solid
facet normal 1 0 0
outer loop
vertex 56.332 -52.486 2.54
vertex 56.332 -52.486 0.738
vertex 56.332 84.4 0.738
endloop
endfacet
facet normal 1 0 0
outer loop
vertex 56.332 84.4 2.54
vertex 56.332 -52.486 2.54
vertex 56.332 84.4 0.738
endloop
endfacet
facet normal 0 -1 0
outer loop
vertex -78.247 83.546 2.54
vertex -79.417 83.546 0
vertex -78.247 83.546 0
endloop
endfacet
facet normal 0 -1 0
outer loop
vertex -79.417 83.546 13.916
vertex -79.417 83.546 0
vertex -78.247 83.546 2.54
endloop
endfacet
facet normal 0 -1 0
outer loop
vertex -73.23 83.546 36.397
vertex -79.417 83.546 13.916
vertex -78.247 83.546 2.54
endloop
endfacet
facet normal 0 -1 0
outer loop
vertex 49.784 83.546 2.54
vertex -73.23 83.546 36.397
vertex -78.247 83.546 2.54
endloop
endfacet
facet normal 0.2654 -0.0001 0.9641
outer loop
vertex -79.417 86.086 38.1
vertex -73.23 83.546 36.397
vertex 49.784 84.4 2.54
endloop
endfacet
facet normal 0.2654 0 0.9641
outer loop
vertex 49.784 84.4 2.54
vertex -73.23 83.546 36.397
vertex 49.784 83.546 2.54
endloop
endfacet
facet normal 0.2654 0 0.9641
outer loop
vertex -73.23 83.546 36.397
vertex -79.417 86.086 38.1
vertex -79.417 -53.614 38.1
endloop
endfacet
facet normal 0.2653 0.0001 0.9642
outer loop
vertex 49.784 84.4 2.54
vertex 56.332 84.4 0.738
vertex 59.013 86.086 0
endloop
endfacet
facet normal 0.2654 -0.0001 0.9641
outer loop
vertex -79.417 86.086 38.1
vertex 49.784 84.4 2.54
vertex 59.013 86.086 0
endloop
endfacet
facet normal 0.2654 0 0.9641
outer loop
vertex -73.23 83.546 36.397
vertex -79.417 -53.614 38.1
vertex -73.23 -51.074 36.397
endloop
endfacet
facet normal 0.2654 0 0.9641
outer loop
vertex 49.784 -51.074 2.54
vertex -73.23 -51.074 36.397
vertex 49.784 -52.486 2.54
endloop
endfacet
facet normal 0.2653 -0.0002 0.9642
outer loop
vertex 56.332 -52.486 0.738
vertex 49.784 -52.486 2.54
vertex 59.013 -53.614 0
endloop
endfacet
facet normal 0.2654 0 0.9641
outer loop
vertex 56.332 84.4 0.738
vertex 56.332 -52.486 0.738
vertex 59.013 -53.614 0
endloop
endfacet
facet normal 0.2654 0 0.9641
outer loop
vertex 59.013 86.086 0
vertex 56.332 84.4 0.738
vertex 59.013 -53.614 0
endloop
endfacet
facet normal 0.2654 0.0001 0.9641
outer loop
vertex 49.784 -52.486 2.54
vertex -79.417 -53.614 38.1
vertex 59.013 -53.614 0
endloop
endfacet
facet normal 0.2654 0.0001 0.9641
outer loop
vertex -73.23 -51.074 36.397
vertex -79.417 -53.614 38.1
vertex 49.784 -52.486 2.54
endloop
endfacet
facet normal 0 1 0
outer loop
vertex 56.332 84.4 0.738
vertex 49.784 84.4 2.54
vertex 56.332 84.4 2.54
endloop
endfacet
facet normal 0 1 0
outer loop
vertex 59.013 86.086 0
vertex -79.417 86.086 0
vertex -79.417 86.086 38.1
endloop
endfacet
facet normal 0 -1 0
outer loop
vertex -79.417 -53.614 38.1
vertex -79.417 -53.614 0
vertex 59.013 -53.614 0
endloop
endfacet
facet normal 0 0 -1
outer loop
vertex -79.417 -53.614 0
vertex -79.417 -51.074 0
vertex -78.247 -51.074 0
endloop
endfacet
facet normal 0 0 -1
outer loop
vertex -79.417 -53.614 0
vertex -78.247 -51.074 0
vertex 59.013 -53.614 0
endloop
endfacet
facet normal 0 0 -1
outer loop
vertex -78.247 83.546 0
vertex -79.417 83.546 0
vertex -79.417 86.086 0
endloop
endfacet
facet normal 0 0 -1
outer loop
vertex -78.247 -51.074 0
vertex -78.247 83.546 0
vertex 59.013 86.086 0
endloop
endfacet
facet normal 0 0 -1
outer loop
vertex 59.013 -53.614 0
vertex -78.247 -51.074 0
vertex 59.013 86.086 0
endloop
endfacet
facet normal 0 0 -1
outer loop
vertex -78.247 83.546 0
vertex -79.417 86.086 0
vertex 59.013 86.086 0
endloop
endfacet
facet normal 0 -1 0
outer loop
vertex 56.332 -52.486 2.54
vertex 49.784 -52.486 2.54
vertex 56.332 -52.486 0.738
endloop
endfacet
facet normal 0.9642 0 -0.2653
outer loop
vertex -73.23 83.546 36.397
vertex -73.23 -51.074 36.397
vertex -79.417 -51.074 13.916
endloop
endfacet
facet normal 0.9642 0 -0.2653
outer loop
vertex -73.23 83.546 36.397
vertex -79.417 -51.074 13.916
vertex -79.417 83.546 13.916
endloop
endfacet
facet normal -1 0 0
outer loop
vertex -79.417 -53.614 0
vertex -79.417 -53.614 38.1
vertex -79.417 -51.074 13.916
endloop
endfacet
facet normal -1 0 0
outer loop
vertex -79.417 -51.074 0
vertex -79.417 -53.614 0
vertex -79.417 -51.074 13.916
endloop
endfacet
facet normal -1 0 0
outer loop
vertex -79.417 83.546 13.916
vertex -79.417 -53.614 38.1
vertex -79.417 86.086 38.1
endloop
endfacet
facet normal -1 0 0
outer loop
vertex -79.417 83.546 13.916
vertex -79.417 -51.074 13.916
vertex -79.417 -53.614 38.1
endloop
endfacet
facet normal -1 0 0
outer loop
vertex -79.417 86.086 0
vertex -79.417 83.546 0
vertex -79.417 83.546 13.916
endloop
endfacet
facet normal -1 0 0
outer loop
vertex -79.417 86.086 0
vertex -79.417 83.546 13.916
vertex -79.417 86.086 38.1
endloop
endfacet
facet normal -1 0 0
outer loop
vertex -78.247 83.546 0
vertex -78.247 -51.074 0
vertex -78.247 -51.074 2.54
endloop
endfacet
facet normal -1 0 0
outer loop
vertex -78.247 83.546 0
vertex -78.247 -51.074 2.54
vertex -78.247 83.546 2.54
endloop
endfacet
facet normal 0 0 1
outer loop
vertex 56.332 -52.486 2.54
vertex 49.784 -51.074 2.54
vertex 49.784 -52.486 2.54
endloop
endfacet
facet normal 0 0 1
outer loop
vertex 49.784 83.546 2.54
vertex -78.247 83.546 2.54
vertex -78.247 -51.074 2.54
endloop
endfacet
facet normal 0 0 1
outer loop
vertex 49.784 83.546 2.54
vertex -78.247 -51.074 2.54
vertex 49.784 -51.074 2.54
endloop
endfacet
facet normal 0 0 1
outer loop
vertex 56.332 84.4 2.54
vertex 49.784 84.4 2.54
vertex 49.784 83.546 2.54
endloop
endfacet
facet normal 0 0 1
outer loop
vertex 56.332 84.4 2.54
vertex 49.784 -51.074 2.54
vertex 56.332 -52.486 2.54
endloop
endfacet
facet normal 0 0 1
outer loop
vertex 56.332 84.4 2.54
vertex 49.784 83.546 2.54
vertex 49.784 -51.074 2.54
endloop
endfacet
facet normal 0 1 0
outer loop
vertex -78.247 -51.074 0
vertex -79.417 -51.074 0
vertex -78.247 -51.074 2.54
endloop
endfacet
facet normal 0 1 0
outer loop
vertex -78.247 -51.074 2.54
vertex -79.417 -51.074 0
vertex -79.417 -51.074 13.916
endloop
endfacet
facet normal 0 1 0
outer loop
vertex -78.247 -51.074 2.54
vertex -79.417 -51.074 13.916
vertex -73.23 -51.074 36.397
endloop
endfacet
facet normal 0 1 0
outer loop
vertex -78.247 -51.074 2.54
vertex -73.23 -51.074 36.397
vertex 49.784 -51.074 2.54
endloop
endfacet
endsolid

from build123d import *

# Parameters (mm, degrees)
F0_W     = 138.43
F0_H     = 139.7
F1_DEPTH = 38.1
F3_DEPTH = 139.701
F4_W     = 133.35
F4_H     = 134.62
F5_DEPTH = 36.7350705877
F6_W     = 134.5792934299
F6_H     = 136.8863768876
F7_DEPTH = 2.54


with BuildPart() as f1:
    # F0 (on Top) → F1 (new body)
    with BuildSketch(Plane.XY):
        with Locations((-10.2020979563, 16.2360354245)):
            Rectangle(F0_W, F0_H)
    extrude(amount=F1_DEPTH)

    # F2 (on face) → F3 (cut, through all)
    with BuildSketch(Plane.XZ.offset(53.6139645755)):
        Polygon((59.0129020437, 38.1), (-79.4170979563, 38.1), (59.0129020437, 0), align=None)
    extrude(amount=-F3_DEPTH, mode=Mode.SUBTRACT)

    # F4 (on face) → F5 (cut, through all)
    with BuildSketch(Plane(origin=(4.1555130146, 0, 15.098363953), x_dir=(0.9641488343, 0, -0.2653620645), z_dir=(0.2653620645, 0, 0.9641488343))):
        with Locations((-13.5877792845, 16.2360354245)):
            Rectangle(F4_W, F4_H)
    extrude(amount=-F5_DEPTH, mode=Mode.SUBTRACT)

    # F6 (on Top) → F7 (join)
    with BuildSketch(Plane.XY):
        with Locations((-10.9574608505, 15.957294032)):
            Rectangle(F6_W, F6_H)
    extrude(amount=F7_DEPTH)


solid = f1.part
